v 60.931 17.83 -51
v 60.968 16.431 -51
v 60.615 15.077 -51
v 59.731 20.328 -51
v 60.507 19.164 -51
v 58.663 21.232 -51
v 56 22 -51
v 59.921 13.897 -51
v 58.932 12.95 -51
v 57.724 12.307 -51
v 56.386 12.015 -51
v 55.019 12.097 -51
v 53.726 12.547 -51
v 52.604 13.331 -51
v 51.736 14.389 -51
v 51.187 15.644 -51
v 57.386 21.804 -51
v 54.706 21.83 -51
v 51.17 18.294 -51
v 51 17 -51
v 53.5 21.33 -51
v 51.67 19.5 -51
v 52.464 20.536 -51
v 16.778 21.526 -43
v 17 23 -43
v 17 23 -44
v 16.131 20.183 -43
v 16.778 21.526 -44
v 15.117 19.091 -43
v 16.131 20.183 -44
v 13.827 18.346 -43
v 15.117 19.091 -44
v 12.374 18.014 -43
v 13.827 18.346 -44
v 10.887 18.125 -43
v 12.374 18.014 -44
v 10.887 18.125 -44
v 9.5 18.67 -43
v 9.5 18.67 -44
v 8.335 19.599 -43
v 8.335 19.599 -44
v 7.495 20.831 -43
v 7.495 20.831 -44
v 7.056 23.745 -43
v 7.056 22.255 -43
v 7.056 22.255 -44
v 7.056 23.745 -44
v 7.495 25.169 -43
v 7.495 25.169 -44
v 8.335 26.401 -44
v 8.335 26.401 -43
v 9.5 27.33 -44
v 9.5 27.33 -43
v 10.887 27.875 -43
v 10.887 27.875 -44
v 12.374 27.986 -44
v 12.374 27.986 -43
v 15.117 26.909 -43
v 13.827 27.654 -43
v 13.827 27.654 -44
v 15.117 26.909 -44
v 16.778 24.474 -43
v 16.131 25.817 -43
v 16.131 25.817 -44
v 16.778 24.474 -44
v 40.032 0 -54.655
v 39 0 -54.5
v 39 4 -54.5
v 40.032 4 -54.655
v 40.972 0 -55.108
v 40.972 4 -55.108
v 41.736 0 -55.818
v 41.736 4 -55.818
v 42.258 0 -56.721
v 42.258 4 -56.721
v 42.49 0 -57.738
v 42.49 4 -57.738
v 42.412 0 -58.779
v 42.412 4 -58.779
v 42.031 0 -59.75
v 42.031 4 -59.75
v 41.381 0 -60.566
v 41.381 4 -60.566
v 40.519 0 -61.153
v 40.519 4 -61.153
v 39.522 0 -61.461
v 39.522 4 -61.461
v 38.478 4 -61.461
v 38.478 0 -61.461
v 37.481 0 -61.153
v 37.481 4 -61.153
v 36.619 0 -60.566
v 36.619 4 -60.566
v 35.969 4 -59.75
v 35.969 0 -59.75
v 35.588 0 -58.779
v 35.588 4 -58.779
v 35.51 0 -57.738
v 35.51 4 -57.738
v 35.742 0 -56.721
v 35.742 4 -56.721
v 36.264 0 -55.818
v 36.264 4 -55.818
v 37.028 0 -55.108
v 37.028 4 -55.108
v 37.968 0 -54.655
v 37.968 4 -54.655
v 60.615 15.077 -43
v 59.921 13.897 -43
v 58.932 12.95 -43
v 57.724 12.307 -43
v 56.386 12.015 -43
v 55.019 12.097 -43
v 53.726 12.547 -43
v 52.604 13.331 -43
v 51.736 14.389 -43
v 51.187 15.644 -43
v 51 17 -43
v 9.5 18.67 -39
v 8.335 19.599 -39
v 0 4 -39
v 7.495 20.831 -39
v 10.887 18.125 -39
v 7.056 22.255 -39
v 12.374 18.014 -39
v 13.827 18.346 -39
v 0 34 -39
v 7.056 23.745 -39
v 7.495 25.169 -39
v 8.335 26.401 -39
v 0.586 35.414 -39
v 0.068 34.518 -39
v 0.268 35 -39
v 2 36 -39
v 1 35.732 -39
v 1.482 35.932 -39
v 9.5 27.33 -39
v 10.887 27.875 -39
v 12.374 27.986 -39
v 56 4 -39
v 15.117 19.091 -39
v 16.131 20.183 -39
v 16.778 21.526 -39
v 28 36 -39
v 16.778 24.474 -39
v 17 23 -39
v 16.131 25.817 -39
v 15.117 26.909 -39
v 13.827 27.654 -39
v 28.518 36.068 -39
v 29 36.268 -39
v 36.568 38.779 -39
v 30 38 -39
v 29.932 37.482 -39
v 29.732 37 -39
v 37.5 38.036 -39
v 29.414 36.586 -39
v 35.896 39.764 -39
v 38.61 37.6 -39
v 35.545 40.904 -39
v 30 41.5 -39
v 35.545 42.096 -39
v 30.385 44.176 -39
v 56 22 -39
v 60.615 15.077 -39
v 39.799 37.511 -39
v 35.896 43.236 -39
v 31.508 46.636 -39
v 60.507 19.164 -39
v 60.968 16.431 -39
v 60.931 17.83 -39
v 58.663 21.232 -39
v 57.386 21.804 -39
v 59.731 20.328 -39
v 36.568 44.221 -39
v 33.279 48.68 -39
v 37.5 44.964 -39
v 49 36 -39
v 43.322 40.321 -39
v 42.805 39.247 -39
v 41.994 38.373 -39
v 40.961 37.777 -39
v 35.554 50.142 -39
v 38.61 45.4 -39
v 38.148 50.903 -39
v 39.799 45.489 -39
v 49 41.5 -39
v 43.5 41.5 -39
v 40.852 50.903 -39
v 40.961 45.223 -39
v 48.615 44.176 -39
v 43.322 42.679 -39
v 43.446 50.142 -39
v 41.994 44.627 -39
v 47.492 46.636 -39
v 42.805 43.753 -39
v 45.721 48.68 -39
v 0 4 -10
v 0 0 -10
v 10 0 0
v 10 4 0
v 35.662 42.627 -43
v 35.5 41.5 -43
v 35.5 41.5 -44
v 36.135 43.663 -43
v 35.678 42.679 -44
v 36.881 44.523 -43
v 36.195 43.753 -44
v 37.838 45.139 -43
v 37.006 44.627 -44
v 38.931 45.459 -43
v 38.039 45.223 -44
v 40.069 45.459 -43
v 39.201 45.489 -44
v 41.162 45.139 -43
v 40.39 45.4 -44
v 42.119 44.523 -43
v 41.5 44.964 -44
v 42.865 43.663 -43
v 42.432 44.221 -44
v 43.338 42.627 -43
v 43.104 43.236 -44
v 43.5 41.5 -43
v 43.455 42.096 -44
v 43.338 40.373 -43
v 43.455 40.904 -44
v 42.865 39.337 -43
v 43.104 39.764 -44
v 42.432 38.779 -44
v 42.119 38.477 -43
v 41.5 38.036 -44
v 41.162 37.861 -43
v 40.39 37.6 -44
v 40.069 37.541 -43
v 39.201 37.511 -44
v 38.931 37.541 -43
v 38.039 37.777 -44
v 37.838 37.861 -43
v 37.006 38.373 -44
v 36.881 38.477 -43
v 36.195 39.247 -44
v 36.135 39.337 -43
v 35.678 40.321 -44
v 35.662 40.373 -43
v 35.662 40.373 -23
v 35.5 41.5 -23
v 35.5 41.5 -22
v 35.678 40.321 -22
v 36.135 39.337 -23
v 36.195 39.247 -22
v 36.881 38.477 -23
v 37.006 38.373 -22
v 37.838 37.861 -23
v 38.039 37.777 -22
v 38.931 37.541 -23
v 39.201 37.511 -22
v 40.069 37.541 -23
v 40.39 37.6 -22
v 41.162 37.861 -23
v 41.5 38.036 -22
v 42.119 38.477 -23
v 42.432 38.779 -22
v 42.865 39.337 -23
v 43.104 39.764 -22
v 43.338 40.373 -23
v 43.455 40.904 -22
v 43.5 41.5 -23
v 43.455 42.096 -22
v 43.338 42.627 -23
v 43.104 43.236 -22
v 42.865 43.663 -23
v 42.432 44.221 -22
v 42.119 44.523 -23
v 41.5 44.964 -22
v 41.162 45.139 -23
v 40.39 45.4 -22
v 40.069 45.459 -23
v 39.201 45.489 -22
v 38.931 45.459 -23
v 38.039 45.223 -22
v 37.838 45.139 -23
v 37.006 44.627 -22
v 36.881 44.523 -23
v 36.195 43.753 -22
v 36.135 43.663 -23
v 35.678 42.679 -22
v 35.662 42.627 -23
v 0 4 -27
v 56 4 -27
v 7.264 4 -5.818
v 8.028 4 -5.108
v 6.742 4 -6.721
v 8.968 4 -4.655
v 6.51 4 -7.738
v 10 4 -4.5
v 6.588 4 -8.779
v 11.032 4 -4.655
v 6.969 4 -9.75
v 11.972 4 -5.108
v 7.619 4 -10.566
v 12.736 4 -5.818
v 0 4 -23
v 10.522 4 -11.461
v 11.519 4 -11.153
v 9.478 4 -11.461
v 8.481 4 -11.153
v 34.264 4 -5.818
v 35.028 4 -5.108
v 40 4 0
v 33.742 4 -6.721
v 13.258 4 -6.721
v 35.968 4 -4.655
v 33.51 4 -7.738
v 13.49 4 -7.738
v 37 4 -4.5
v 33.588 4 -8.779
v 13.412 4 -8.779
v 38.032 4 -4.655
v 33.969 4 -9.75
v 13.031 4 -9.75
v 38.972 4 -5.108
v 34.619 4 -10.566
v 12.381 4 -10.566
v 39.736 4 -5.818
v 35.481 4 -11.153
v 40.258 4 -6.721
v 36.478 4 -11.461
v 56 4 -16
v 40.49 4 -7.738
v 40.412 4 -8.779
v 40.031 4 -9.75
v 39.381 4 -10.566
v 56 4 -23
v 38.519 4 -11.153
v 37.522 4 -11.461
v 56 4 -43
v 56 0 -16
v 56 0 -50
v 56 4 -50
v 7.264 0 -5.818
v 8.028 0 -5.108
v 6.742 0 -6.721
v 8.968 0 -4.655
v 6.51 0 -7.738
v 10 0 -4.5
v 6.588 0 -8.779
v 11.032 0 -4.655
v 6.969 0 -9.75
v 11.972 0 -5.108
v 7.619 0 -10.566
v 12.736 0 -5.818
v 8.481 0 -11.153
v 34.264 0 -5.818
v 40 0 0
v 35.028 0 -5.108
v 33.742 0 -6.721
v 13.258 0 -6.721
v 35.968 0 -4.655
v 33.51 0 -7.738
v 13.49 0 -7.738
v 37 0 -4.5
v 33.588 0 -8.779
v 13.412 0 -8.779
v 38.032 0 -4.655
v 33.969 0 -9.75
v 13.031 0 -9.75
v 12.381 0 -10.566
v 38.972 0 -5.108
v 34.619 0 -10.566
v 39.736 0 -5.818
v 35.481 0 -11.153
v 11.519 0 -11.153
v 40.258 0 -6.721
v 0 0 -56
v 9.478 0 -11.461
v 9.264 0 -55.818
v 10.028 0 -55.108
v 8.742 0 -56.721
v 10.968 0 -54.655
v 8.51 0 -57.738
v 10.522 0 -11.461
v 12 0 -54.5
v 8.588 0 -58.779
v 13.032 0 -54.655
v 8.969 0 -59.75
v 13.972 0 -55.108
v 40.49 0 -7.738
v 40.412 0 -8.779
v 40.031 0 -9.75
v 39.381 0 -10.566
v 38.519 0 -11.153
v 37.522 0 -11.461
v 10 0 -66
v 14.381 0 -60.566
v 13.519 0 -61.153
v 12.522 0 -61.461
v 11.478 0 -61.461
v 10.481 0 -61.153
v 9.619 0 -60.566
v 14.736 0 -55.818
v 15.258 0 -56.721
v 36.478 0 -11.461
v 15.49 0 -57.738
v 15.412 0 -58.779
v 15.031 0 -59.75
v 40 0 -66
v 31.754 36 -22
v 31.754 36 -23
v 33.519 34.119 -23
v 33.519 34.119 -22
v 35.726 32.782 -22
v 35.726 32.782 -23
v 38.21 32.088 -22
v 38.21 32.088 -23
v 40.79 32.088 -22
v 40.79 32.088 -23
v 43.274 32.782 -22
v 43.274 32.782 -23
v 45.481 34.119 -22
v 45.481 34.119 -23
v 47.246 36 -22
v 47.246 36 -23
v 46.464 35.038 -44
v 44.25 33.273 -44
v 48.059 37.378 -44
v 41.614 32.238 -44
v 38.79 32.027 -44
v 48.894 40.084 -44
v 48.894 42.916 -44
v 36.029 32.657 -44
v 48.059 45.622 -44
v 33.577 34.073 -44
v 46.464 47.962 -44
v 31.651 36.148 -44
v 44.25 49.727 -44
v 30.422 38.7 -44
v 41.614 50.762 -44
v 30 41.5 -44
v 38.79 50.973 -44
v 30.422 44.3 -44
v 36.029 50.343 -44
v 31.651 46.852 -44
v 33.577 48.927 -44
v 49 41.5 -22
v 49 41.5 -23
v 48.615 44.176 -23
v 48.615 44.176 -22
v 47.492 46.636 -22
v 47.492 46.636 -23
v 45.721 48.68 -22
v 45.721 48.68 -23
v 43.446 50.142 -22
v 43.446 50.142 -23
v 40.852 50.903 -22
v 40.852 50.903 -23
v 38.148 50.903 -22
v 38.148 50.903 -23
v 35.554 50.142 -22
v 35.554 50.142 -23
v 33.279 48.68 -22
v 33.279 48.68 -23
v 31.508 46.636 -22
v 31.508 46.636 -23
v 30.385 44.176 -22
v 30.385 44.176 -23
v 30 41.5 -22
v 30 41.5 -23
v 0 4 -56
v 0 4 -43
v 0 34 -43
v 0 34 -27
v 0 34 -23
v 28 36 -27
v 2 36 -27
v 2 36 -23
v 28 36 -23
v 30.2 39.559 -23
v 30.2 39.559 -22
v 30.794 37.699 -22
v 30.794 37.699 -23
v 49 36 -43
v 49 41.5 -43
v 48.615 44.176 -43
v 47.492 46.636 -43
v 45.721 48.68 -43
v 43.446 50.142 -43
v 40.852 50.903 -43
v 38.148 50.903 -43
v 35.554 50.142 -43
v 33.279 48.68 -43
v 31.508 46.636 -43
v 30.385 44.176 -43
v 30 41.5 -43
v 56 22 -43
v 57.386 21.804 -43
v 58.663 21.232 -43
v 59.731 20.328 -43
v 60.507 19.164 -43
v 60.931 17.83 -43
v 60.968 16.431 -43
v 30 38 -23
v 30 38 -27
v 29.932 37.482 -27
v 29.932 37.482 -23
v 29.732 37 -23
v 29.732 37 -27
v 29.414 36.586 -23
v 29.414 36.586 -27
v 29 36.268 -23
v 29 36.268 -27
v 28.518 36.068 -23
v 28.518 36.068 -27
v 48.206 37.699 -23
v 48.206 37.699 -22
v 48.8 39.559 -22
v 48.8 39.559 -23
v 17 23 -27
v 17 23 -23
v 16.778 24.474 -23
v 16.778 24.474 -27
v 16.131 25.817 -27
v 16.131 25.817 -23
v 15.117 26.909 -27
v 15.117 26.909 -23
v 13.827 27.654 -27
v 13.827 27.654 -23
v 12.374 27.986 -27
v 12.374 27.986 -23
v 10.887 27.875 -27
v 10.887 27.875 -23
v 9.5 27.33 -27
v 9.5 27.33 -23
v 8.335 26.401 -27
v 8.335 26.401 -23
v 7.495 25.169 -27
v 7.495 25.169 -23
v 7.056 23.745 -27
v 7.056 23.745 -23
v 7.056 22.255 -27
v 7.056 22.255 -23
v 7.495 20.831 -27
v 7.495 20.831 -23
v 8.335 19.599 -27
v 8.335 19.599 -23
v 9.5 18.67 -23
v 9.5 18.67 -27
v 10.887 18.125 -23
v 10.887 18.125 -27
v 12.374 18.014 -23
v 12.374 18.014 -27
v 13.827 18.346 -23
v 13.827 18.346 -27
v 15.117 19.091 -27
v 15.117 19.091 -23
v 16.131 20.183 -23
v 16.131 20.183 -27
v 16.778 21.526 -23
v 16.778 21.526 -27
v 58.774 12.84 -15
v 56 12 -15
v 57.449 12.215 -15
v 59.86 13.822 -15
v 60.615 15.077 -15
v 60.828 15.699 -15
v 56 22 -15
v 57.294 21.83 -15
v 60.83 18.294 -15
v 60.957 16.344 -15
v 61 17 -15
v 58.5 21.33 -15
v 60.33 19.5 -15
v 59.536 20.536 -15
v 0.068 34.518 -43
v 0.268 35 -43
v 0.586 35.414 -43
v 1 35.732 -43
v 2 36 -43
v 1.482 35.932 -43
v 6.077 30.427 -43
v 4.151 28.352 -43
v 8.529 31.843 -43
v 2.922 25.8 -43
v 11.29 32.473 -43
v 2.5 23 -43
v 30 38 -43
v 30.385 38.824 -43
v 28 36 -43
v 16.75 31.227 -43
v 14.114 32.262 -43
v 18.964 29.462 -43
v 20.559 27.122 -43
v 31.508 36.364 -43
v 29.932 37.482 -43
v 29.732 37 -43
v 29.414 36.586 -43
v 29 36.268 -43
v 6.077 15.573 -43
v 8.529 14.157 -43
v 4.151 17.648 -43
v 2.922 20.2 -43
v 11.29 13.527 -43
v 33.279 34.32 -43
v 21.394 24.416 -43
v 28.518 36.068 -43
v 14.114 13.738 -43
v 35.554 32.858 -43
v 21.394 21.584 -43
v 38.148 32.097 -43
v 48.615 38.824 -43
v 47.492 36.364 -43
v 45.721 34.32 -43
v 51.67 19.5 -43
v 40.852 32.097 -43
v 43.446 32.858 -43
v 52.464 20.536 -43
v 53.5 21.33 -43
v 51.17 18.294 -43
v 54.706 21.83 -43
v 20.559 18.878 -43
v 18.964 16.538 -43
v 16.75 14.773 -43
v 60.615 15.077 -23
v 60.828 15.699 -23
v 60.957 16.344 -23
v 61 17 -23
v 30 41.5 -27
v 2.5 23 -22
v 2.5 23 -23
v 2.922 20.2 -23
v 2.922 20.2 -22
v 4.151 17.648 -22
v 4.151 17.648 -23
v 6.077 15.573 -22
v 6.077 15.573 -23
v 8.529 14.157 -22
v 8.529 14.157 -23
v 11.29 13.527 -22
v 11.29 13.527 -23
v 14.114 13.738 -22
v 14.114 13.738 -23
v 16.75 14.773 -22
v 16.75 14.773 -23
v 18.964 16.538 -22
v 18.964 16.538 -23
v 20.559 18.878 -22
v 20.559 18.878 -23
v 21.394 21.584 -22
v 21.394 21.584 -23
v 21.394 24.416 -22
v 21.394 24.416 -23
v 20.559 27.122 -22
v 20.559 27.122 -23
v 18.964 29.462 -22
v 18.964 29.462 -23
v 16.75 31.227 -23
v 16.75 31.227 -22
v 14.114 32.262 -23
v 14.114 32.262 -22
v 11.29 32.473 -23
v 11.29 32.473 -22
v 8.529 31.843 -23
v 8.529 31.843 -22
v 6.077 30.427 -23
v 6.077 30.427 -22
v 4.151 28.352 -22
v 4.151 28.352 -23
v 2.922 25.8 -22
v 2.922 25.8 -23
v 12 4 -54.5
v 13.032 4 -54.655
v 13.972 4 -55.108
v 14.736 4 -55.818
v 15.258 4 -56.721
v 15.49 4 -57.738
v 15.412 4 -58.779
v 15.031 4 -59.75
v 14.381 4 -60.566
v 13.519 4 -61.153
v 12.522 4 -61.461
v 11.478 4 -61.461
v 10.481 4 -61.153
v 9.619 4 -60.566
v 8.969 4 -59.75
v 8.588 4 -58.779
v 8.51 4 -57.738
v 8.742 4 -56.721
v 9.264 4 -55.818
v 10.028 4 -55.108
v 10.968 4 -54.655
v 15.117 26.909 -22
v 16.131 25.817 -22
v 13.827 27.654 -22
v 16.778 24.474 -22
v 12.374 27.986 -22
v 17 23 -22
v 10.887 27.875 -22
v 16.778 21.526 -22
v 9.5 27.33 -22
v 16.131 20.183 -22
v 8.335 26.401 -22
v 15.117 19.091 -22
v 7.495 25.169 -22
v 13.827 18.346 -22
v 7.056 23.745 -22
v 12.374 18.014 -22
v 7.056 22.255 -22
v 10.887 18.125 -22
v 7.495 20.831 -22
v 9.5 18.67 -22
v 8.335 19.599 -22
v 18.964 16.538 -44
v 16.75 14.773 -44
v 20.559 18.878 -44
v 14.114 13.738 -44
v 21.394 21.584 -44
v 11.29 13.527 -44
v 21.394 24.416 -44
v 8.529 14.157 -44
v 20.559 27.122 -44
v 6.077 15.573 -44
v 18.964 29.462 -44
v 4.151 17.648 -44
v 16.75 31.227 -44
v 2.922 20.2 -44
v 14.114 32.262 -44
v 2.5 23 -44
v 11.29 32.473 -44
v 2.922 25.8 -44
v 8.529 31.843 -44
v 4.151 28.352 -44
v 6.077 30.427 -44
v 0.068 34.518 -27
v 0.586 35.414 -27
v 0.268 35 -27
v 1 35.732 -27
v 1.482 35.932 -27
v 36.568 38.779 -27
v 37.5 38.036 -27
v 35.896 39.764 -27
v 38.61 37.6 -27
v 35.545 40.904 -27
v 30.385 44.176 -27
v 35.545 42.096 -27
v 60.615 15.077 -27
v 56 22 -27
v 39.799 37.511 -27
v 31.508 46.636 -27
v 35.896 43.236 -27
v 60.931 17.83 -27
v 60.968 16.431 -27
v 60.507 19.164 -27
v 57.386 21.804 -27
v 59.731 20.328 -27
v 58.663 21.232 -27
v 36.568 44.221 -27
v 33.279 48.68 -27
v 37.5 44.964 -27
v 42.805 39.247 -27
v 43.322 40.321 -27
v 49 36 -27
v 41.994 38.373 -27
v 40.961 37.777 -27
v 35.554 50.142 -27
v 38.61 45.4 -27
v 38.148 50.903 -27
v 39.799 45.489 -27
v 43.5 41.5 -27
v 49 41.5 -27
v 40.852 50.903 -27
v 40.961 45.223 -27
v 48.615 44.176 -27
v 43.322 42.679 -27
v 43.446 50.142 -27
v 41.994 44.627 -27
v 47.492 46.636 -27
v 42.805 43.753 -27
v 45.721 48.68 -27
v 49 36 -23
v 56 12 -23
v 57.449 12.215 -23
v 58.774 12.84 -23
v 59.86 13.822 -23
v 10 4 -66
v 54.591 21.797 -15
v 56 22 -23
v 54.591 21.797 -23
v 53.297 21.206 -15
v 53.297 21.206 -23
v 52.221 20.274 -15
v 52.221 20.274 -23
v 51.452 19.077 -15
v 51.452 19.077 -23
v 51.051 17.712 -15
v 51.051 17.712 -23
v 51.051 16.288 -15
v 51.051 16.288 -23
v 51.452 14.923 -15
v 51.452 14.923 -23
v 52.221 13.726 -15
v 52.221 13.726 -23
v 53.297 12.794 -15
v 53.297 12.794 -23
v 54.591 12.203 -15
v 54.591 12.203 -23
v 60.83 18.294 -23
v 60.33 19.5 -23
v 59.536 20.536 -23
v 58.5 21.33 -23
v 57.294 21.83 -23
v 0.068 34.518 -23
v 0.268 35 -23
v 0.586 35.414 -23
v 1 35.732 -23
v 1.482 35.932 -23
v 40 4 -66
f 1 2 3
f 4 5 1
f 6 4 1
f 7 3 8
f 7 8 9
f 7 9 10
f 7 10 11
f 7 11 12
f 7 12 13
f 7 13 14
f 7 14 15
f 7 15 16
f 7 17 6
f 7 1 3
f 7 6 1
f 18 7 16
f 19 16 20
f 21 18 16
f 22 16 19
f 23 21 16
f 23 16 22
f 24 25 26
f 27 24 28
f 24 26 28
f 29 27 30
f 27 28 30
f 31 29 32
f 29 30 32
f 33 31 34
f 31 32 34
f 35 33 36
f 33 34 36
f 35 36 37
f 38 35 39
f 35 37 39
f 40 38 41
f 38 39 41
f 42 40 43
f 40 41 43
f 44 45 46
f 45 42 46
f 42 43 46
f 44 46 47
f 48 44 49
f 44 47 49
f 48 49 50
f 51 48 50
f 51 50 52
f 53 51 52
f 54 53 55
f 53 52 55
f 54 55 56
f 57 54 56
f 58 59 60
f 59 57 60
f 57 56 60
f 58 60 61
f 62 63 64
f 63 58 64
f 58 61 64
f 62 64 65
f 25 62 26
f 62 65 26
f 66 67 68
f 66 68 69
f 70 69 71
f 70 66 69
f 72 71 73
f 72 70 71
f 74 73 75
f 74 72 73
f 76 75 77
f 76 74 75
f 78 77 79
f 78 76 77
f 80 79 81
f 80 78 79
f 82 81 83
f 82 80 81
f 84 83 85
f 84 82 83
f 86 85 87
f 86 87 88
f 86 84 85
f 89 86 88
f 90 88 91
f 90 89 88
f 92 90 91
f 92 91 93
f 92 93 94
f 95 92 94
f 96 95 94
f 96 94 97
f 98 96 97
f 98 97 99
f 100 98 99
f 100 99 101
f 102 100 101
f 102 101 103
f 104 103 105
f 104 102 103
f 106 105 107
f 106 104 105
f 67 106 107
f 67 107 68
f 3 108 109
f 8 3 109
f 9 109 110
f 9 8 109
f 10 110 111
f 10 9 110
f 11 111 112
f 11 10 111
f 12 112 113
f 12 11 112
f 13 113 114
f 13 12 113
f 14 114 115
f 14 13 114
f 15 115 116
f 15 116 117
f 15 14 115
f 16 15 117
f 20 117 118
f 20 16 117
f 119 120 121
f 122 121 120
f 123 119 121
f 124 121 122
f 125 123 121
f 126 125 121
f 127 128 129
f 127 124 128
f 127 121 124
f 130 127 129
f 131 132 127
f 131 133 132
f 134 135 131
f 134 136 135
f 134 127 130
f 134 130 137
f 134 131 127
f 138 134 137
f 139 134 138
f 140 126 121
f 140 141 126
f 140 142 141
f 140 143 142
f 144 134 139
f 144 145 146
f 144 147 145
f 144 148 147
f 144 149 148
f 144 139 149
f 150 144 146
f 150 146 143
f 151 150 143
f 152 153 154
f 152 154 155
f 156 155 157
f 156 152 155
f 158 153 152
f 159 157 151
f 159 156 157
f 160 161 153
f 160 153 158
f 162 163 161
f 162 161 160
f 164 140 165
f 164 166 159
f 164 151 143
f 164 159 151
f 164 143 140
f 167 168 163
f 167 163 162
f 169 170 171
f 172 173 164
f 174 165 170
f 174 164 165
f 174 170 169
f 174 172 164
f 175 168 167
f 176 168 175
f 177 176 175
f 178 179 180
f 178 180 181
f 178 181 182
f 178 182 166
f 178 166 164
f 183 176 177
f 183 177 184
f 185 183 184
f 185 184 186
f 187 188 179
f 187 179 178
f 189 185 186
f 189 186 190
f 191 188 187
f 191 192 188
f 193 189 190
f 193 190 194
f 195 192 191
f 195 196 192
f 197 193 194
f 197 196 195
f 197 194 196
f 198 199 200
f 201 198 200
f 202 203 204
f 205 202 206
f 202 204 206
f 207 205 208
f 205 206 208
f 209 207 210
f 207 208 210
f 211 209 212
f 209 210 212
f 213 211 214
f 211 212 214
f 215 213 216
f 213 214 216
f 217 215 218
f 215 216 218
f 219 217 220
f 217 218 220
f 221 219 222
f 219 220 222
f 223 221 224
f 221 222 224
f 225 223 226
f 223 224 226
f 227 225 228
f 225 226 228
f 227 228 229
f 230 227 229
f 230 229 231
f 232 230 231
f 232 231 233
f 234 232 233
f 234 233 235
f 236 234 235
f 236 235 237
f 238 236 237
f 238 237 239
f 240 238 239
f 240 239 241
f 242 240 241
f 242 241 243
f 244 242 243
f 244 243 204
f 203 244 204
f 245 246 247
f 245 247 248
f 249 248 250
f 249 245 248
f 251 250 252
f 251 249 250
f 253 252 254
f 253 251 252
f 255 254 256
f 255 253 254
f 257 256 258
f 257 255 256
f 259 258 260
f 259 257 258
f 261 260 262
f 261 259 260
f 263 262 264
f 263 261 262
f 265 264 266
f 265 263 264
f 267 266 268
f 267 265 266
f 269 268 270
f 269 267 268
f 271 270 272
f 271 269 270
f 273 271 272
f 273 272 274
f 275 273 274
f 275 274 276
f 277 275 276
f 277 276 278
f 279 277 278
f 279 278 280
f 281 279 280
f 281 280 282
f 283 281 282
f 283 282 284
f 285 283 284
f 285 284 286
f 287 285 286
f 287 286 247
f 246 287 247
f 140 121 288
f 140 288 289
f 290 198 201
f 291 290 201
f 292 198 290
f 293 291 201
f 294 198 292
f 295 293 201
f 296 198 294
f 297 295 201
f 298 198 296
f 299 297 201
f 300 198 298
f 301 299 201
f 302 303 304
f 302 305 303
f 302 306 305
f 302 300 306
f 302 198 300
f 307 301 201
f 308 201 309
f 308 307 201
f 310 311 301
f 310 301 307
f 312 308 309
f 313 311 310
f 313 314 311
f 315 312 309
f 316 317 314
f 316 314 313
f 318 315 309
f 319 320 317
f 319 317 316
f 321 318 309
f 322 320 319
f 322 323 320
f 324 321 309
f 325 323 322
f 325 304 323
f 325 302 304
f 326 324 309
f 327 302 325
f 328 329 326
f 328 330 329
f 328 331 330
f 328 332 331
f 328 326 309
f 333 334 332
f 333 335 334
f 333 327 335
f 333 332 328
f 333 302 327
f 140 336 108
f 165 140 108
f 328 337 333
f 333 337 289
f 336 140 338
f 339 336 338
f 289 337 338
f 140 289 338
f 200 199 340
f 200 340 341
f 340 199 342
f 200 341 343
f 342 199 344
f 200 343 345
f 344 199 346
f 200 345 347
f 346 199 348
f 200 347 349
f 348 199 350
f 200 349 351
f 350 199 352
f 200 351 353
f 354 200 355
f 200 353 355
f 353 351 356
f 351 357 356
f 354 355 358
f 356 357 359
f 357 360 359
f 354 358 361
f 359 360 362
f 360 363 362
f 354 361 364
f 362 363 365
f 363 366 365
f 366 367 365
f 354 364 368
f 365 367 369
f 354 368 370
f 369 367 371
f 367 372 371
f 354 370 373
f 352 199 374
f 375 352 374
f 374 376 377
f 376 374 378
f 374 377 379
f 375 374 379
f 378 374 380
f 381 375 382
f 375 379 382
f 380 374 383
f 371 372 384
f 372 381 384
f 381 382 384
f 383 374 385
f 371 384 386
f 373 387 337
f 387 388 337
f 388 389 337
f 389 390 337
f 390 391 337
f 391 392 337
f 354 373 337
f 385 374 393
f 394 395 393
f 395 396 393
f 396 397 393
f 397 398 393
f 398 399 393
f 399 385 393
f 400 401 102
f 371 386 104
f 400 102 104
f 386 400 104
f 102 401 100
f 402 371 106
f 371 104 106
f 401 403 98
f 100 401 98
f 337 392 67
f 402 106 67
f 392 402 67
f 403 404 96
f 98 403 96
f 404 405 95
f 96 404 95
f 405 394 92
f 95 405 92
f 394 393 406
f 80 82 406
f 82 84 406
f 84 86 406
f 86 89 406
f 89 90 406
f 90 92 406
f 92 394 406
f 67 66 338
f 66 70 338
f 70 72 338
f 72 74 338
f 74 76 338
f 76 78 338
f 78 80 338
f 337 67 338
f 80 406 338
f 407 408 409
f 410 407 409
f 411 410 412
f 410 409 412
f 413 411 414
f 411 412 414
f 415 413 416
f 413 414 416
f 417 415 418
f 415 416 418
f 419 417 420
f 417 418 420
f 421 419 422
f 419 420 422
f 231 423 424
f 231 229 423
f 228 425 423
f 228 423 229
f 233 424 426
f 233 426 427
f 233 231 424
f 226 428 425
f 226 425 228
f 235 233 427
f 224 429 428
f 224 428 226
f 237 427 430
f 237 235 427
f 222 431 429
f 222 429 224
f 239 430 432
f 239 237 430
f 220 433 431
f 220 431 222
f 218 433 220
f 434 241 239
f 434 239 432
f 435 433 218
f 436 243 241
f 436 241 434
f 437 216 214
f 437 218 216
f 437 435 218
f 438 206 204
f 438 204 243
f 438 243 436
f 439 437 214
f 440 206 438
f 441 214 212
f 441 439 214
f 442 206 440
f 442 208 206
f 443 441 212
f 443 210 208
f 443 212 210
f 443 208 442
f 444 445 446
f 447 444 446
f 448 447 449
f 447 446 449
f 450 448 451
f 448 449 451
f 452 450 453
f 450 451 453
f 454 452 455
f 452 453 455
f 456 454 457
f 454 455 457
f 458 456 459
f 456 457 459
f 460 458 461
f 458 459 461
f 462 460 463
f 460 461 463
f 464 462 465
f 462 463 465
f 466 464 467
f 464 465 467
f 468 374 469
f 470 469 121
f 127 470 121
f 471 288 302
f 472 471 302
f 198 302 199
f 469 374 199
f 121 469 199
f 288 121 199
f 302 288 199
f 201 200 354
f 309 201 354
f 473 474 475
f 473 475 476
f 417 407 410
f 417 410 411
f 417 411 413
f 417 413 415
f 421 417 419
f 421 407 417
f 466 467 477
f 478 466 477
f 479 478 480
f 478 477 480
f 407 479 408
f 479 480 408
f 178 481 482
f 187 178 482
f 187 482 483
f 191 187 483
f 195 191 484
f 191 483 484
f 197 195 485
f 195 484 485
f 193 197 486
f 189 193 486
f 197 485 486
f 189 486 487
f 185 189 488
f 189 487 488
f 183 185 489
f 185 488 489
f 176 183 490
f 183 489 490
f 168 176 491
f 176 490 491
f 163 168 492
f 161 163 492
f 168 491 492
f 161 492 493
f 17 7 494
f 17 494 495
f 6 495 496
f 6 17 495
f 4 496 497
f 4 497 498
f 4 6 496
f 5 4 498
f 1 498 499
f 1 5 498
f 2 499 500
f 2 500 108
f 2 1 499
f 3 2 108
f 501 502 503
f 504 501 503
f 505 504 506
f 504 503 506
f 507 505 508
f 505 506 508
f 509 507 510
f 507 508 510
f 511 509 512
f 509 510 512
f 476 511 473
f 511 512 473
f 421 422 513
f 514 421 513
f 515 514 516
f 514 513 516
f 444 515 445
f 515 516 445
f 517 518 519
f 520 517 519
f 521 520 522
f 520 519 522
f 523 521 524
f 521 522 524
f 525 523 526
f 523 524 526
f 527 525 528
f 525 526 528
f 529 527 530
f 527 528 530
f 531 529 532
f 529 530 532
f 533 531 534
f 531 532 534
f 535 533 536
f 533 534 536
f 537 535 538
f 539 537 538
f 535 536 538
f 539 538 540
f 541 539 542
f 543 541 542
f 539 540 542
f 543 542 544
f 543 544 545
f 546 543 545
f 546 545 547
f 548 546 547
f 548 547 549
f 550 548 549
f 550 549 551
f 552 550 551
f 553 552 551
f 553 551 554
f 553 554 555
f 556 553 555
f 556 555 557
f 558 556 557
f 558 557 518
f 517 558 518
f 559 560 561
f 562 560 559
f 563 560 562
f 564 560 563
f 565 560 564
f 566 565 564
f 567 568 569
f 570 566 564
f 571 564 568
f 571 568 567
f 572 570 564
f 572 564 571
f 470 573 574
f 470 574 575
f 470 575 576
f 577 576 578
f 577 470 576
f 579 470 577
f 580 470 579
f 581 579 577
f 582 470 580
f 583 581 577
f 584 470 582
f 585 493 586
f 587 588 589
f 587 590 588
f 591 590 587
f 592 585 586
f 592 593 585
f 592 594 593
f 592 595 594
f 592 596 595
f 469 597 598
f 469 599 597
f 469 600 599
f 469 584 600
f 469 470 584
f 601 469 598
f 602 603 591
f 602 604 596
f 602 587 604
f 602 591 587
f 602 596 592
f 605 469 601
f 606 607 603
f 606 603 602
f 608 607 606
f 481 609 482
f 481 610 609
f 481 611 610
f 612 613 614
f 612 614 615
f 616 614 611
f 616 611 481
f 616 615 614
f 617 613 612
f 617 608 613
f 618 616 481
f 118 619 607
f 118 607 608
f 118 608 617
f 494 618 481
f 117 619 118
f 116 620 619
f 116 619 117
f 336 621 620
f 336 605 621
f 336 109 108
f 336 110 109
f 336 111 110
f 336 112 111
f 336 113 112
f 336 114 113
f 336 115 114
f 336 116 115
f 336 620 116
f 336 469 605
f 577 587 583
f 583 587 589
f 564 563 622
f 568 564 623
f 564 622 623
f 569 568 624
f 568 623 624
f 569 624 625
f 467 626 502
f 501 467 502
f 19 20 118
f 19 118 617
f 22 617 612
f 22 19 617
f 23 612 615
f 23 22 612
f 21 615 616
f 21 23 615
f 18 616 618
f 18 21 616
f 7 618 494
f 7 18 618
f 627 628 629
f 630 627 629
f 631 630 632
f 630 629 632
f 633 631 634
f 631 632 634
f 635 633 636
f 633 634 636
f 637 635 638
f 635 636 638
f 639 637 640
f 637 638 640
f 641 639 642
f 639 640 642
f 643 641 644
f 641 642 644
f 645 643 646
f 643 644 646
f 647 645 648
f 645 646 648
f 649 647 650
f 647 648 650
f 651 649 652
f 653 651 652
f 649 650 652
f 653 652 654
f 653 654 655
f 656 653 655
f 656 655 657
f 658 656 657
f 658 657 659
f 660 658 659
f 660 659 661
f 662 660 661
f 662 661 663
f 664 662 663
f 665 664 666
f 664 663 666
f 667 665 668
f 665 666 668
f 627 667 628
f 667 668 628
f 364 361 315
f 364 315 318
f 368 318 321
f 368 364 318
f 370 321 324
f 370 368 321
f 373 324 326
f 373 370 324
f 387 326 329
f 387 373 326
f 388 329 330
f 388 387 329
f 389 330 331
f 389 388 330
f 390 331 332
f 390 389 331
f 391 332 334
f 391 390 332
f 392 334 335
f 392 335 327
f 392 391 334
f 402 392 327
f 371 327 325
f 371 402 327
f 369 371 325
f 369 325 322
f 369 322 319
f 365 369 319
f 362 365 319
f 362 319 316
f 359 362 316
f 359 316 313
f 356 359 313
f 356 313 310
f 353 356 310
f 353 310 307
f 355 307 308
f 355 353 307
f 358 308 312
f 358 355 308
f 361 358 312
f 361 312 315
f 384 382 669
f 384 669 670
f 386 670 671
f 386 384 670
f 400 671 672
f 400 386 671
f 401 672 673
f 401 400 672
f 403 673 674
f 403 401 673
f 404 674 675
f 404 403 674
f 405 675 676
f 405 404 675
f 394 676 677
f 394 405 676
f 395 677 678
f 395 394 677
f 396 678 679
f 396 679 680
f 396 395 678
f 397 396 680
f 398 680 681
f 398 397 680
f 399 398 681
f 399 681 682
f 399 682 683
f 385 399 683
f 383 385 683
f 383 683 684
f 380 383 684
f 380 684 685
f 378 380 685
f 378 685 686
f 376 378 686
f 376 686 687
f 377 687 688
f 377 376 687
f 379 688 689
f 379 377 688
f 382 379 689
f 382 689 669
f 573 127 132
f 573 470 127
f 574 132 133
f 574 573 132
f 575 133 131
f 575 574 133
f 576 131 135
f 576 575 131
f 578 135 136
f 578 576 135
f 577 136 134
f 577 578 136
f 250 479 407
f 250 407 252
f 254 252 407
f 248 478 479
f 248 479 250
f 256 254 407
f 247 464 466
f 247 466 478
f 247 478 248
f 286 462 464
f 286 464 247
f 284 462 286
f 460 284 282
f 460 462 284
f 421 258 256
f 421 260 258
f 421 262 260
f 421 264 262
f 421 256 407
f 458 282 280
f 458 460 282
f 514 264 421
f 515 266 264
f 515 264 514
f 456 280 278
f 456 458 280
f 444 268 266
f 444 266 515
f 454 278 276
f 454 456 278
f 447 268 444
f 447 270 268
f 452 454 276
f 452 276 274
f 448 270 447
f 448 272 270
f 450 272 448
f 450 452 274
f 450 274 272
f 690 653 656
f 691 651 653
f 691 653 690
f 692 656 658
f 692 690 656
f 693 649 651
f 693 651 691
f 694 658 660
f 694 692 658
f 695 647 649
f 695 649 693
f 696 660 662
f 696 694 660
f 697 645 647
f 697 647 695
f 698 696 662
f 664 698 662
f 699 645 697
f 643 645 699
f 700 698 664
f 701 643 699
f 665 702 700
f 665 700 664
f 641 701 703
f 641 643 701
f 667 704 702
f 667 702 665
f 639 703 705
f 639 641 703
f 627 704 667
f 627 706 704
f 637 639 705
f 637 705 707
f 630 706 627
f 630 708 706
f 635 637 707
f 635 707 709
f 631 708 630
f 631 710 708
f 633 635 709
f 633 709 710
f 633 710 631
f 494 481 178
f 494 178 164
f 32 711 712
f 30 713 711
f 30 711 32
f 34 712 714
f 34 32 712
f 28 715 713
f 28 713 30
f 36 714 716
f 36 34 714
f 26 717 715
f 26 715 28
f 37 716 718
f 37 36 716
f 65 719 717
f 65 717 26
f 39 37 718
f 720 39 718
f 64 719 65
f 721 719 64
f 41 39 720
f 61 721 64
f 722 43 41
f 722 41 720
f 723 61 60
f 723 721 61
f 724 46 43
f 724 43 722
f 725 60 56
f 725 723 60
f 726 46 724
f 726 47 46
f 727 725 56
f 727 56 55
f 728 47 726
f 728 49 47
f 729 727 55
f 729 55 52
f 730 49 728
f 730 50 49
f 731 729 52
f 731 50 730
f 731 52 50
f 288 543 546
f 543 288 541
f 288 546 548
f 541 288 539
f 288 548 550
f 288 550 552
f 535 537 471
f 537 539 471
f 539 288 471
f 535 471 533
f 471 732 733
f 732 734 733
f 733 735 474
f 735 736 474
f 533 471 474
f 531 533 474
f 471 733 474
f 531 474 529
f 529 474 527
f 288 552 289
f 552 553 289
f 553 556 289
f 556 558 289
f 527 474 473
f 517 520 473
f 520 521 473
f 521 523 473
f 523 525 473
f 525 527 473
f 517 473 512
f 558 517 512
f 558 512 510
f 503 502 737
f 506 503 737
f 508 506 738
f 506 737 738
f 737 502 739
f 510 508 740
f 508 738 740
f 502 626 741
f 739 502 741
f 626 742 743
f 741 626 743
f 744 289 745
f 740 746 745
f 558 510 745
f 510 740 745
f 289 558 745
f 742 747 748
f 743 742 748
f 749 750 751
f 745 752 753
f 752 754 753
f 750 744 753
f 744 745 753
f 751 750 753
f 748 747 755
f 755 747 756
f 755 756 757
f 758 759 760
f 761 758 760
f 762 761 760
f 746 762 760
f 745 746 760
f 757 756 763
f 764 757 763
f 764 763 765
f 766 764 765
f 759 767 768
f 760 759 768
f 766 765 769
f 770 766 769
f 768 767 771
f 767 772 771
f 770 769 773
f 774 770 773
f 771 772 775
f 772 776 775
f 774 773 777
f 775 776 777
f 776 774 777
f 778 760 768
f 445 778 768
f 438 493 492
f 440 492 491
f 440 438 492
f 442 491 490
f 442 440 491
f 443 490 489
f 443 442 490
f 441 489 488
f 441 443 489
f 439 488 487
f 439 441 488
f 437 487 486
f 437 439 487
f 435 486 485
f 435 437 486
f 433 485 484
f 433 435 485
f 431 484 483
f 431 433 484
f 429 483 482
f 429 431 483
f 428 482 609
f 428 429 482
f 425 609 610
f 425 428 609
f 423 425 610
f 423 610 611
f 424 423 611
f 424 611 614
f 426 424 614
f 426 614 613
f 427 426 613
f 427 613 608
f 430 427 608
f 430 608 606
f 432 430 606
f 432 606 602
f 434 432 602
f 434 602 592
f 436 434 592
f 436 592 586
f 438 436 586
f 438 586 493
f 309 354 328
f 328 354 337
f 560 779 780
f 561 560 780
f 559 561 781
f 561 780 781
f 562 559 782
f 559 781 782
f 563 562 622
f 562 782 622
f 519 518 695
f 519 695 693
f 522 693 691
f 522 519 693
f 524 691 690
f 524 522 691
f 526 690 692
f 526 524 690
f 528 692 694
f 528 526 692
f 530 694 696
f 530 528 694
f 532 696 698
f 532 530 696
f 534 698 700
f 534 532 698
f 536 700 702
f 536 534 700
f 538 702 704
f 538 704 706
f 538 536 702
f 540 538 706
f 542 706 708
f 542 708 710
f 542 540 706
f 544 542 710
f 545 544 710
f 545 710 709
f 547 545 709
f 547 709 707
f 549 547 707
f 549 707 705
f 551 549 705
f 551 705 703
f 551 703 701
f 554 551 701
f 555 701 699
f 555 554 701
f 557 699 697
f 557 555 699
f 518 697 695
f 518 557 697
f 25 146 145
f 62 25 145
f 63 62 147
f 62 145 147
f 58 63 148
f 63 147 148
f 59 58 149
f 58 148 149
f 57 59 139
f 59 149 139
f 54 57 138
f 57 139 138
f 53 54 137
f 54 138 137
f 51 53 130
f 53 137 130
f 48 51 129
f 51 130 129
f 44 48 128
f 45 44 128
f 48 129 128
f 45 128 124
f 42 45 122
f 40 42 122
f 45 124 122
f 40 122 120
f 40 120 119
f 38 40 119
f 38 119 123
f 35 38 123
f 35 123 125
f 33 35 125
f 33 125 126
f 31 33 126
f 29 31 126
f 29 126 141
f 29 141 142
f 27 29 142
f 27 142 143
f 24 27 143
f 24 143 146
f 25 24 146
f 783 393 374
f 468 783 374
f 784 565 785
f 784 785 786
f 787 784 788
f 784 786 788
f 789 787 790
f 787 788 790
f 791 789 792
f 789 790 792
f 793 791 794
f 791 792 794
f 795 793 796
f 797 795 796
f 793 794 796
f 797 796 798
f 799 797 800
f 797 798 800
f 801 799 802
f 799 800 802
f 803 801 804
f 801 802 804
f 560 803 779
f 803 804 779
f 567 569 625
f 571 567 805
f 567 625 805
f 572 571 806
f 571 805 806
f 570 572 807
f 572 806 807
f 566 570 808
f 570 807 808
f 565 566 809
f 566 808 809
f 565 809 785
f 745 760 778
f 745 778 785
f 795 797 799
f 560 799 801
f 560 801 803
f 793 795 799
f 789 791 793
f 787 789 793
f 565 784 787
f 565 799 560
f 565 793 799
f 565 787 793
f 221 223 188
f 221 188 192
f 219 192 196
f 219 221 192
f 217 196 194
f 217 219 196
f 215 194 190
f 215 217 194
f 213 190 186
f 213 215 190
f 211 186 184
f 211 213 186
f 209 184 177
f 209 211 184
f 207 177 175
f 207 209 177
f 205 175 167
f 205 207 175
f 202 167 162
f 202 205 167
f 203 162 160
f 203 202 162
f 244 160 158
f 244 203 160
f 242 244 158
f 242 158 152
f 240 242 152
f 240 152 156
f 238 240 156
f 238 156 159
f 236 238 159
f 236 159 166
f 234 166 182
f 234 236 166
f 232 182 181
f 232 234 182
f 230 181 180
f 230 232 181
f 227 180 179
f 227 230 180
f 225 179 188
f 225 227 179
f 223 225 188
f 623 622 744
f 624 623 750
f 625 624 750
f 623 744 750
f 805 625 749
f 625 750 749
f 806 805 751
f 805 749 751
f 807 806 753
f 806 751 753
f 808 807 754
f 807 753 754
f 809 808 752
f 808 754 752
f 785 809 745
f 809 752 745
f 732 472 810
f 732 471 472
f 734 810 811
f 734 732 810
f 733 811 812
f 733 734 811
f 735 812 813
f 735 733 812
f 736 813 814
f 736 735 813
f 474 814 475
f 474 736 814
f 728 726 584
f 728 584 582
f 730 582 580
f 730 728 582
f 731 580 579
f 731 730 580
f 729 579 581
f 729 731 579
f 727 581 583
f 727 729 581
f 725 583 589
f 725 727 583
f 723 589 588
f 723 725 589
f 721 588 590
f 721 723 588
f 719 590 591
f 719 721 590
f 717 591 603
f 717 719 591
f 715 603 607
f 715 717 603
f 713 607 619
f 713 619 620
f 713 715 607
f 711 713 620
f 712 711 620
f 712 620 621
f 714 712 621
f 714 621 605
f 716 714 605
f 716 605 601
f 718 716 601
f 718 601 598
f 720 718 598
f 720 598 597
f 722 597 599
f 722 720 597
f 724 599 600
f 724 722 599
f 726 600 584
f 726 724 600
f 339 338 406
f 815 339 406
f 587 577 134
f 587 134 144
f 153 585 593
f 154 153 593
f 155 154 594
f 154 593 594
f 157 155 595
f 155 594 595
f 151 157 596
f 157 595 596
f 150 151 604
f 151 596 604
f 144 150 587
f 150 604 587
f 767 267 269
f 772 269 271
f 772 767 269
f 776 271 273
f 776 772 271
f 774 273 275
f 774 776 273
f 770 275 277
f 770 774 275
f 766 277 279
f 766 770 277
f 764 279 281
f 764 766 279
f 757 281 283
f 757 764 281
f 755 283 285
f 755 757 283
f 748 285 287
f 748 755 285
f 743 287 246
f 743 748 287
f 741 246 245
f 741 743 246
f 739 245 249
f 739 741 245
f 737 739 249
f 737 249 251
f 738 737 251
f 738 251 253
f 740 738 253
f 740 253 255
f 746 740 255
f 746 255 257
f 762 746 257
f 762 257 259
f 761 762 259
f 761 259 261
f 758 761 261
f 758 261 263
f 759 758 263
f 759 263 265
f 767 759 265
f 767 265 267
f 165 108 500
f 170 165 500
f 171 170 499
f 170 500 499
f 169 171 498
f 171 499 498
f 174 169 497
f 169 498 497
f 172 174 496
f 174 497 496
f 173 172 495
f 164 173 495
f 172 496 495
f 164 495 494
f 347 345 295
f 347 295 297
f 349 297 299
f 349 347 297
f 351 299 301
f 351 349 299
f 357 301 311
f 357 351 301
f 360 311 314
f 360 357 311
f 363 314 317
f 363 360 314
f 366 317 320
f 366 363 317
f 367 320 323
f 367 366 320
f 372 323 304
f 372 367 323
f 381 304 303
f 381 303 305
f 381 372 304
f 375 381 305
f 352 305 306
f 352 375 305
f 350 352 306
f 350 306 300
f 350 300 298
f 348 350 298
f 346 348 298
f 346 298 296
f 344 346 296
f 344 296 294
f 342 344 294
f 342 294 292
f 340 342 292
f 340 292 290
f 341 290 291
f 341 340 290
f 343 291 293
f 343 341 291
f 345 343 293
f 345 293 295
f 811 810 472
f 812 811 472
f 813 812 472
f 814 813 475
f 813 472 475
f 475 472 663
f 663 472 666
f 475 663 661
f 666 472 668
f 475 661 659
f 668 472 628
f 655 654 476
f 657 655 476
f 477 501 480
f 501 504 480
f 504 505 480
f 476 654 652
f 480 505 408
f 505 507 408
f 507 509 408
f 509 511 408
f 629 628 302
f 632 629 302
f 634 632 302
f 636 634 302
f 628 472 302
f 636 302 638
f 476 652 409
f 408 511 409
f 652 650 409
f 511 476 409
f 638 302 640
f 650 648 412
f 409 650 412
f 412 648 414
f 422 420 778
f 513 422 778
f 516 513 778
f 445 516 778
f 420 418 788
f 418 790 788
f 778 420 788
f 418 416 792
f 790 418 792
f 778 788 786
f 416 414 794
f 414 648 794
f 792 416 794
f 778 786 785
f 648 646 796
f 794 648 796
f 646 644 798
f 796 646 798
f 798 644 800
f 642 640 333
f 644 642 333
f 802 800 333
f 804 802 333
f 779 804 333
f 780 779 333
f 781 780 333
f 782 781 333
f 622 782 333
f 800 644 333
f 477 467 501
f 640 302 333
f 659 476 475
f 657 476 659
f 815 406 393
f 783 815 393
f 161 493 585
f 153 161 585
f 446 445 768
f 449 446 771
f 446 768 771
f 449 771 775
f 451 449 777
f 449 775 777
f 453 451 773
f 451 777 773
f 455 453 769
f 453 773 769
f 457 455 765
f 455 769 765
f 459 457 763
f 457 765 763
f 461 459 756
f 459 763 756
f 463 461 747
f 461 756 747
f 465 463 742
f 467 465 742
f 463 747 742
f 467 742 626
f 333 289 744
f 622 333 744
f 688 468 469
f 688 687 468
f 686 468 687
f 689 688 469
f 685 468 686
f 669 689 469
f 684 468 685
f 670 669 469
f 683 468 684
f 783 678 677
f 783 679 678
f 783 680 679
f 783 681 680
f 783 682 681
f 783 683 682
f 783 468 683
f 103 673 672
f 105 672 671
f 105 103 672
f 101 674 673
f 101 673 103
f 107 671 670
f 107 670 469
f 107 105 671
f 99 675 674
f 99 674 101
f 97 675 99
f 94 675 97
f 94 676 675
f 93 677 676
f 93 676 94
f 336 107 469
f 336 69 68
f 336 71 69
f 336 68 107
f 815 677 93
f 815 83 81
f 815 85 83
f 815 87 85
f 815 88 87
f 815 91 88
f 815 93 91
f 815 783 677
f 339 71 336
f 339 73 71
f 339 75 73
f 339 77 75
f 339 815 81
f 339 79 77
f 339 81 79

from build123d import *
from build123d.topology import SkipClean

# Parameters (mm, degrees)
SKETCH1_R               = 3.5
SKETCH1_W               = 56
SKETCH1_H               = 4
SKETCH1_H_2             = 12
BOSS_EXTRUDE1_DEPTH     = 4
SKETCH1_3_W             = 56
SKETCH1_3_H             = 4
BOSS_EXTRUDE2_DEPTH     = 36
SKETCH2_R               = 5
CUT_EXTRUDE1_DEPTH      = 36
BOSS_EXTRUDE3_START     = -20
BOSS_EXTRUDE3_OUTLINE_R = 9.5
BOSS_EXTRUDE3_DEPTH     = 20
CUT_EXTRUDE2_START      = -21
SKETCH2_4_R             = 4
CUT_EXTRUDE2_DEPTH      = 21
SKETCH4_W               = 61
SKETCH4_H               = 12
CUT_EXTRUDE3_DEPTH      = 47
BOSS_EXTRUDE4_START     = 1
SKETCH5_R               = 4
SKETCH5_R_2             = 9.5
SKETCH5_R_3             = 5
BOSS_EXTRUDE4_DEPTH     = 1
BOSS_EXTRUDE5_START     = 8
BOSS_EXTRUDE5_DEPTH     = 8
BOSS_EXTRUDE6_DEPTH     = 8
SKETCH2_6_R             = 9.5
SKETCH2_6_R_2           = 5
SKETCH2_6_R_3           = 4
BOSS_EXTRUDE7_DEPTH     = 1


# Read off the part's stored shape, not the designer's step: Boss-Extrude3
with BuildPart() as part:
    # Sketch1 → Boss-Extrude1 (new body)
    # profile 1 of 5: a face of its own
    with BuildSketch(Plane(origin=(0, 0, 0), x_dir=(1, 0, 0), z_dir=(0, 1, 0))):
        Polygon((56, 23), (0, 23), (0, 10), (10, 0), (40, 0), (56, 16), align=None)
        with Locations(Location((10, 8, 0), (0, 0, 270))):
            Circle(SKETCH1_R, mode=Mode.SUBTRACT)
        with Locations(Location((37, 8, 0), (0, 0, 270))):
            Circle(SKETCH1_R, mode=Mode.SUBTRACT)
    # profile 2 of 5: a face of its own
    with BuildSketch(Plane(origin=(0, 0, 0), x_dir=(1, 0, 0), z_dir=(0, 1, 0))):
        with Locations((28, 25)):
            Rectangle(SKETCH1_W, SKETCH1_H)
    # profile 3 of 5: a face of its own
    with BuildSketch(Plane(origin=(0, 0, 0), x_dir=(1, 0, 0), z_dir=(0, 1, 0))):
        with Locations((28, 33)):
            Rectangle(SKETCH1_W, SKETCH1_H_2)
    # profile 4 of 5: a face of its own
    with BuildSketch(Plane(origin=(0, 0, 0), x_dir=(1, 0, 0), z_dir=(0, 1, 0))):
        with Locations((28, 41)):
            Rectangle(SKETCH1_W, SKETCH1_H)
    # profile 5 of 5: a face of its own
    with BuildSketch(Plane(origin=(0, 0, 0), x_dir=(1, 0, 0), z_dir=(0, 1, 0))):
        Polygon((40, 66), (10, 66), (0, 56), (0, 43), (56, 43), (56, 50), align=None)
        with Locations(Location((12, 58, 0), (0, 0, 270))):
            Circle(SKETCH1_R, mode=Mode.SUBTRACT)
        with Locations(Location((39, 58, 0), (0, 0, 270))):
            Circle(SKETCH1_R, mode=Mode.SUBTRACT)
    extrude(amount=BOSS_EXTRUDE1_DEPTH)

    # Sketch1<3> → Boss-Extrude2 (add)
    with BuildSketch(Plane(origin=(0, 0, 0), x_dir=(1, 0, 0), z_dir=(0, 1, 0))):
        with Locations((28, 41)):
            Rectangle(SKETCH1_3_W, SKETCH1_3_H)
        with Locations((28, 25)):
            Rectangle(SKETCH1_3_W, SKETCH1_3_H)
    extrude(amount=BOSS_EXTRUDE2_DEPTH)

    # Sketch2 → Cut-Extrude1 (cut)
    with BuildSketch(Plane.XY.offset(-23)):
        with Locations((12, 23)):
            Circle(SKETCH2_R)
    extrude(amount=-CUT_EXTRUDE1_DEPTH, mode=Mode.SUBTRACT)

    # Boss-Extrude3 outline → Boss-Extrude3 (add)
    with BuildSketch(Plane.XY.offset(-23).offset(BOSS_EXTRUDE3_START)):
        with BuildLine():
            Line((28, 36), (2, 36))
            ThreePointArc((2, 36), (0.585786438, 35.414213562), (0, 34))
            Line((0, 34), (0, 4))
            Line((0, 4), (56, 4))
            Line((56, 4), (60.615384615, 15.076923077))
            ThreePointArc((60.615384615, 15.076923077), (60.160251472, 19.773500981), (56, 22))
            Line((56, 22), (49, 36))
            Line((49, 36), (49, 41.5))
            ThreePointArc((49, 41.5), (39.5, 51), (30, 41.5))
            Line((30, 41.5), (30, 38))
            ThreePointArc((30, 38), (29.414213562, 36.585786438), (28, 36))
        make_face()
        with Locations((12, 23)):
            Circle(BOSS_EXTRUDE3_OUTLINE_R, mode=Mode.SUBTRACT)
    extrude(amount=BOSS_EXTRUDE3_DEPTH)

    # Sketch2<4> → Cut-Extrude2 (cut)
    with SkipClean():  # the faces are left unmerged after this step: merging them gives an invalid solid
        with BuildSketch(Plane.XY.offset(-23).offset(CUT_EXTRUDE2_START)):
            with BuildLine():
                Line((30, 38), (30, 41.5))
                ThreePointArc((30, 41.5), (39.5, 51), (49, 41.5))
                Line((49, 41.5), (49, 36))
                Line((49, 36), (56, 36))
                Line((56, 36), (56, 22))
                ThreePointArc((56, 22), (59.535533906, 20.535533906), (61, 17))
                ThreePointArc((61, 17), (60.902903378, 16.019419324), (60.615384615, 15.076923077))
                Line((60.615384615, 15.076923077), (56, 4))
                Line((56, 4), (64.674649384, 4))
                Line((64.674649384, 4), (64.674649384, 61.803942061))
                Line((64.674649384, 61.803942061), (-6.186238706, 61.803942061))
                Line((-6.186238706, 61.803942061), (-6.186238706, 4))
                Line((-6.186238706, 4), (0, 4))
                Line((0, 4), (0, 34))
                Line((0, 34), (0, 36))
                Line((0, 36), (2, 36))
                Line((2, 36), (28, 36))
                ThreePointArc((28, 36), (29.414213562, 36.585786438), (30, 38))
            make_face()
            with BuildLine():
                ThreePointArc((0, 34), (0.585786438, 35.414213562), (2, 36))
                Line((2, 36), (0, 36))
                Line((0, 36), (0, 34))
            make_face()
            Polygon((56, 36), (49, 36), (56, 22), align=None)
            with Locations((39.5, 41.5)):
                Circle(SKETCH2_4_R)
        extrude(amount=CUT_EXTRUDE2_DEPTH, mode=Mode.SUBTRACT)
    add(part.part.scale(1), mode=Mode.REPLACE)  # the faces are merged on a copy

    # Sketch4 → Cut-Extrude3 (cut)
    with BuildSketch(Plane(origin=(0, 51, 0), x_dir=(1, 0, 0), z_dir=(0, 1, 0))):
        with Locations((30.5, 33)):
            Rectangle(SKETCH4_W, SKETCH4_H)
    extrude(amount=-CUT_EXTRUDE3_DEPTH, mode=Mode.SUBTRACT)

    # Sketch5 → Boss-Extrude4 (add)
    # profile 1 of 2: a face of its own
    with SkipClean():  # the faces are left unmerged after this step: merging them gives an invalid solid
        with BuildSketch(Plane(origin=(0, 0, -43), x_dir=(-1, 0, 0), z_dir=(0, 0, -1)).offset(BOSS_EXTRUDE4_START)):
            with BuildLine():
                ThreePointArc((-49, 41.5), (-39.5, 32), (-30, 41.5))
                ThreePointArc((-30, 41.5), (-39.5, 51), (-49, 41.5))
            make_face()
            with Locations((-39.5, 41.5)):
                Circle(SKETCH5_R, mode=Mode.SUBTRACT)
        # profile 2 of 2: a face of its own
        with BuildSketch(Plane(origin=(0, 0, -43), x_dir=(-1, 0, 0), z_dir=(0, 0, -1)).offset(BOSS_EXTRUDE4_START)):
            with Locations((-12, 23)):
                Circle(SKETCH5_R_2)
            with Locations(Location((-12, 23, 0), (0, 0, 180))):
                Circle(SKETCH5_R_3, mode=Mode.SUBTRACT)
        extrude(amount=-BOSS_EXTRUDE4_DEPTH)

    # Sketch5<3> → Boss-Extrude5 (add)
    with SkipClean():  # the faces are left unmerged after this step: merging them gives an invalid solid
        with BuildSketch(Plane(origin=(0, 0, -43), x_dir=(-1, 0, 0), z_dir=(0, 0, -1)).offset(BOSS_EXTRUDE5_START)):
            with BuildLine():
                ThreePointArc((-60.615384615, 15.076923077), (-55.019419324, 12.097096622), (-51, 17))
                ThreePointArc((-51, 17), (-52.464466094, 20.535533906), (-56, 22))
                ThreePointArc((-56, 22), (-60.160251472, 19.773500981), (-60.615384615, 15.076923077))
            make_face()
        extrude(amount=-BOSS_EXTRUDE5_DEPTH)

    # Sketch2<5> → Boss-Extrude6 (add)
    with SkipClean():  # the faces are left unmerged after this step: merging them gives an invalid solid
        with BuildSketch(Plane.XY.offset(-23)):
            with BuildLine():
                Line((56, 12), (56, 22))
                ThreePointArc((56, 22), (51, 17), (56, 12))
            make_face()
            with BuildLine():
                ThreePointArc((61, 17), (59.535533906, 20.535533906), (56, 22))
                Line((56, 22), (56, 12))
                ThreePointArc((56, 12), (58.773500981, 12.839748528), (60.615384615, 15.076923077))
                ThreePointArc((60.615384615, 15.076923077), (60.902903378, 16.019419324), (61, 17))
            make_face()
        extrude(amount=BOSS_EXTRUDE6_DEPTH)

    # Sketch2<6> → Boss-Extrude7 (add)
    # profile 1 of 3: a face of its own
    with BuildSketch(Plane.XY.offset(-23)):
        with Locations(Location((12, 23, 0), (0, 0, 180))):
            Circle(SKETCH2_6_R)
        with Locations((12, 23)):
            Circle(SKETCH2_6_R_2, mode=Mode.SUBTRACT)
    # profile 2 of 3: a face of its own
    with BuildSketch(Plane.XY.offset(-23)):
        with BuildLine():
            ThreePointArc((49, 41.5), (39.5, 51), (30, 41.5))
            ThreePointArc((30, 41.5), (30.449124805, 38.613538808), (31.754033308, 36))
            Line((31.754033308, 36), (47.245966692, 36))
            ThreePointArc((47.245966692, 36), (48.550875195, 38.613538808), (49, 41.5))
        make_face()
        with Locations(Location((39.5, 41.5, 0), (0, 0, 180))):
            Circle(SKETCH2_6_R_3, mode=Mode.SUBTRACT)
    # profile 3 of 3: a face of its own
    with BuildSketch(Plane.XY.offset(-23)):
        with BuildLine():
            Line((47.245966692, 36), (31.754033308, 36))
            ThreePointArc((31.754033308, 36), (39.5, 32), (47.245966692, 36))
        make_face()
    extrude(amount=BOSS_EXTRUDE7_DEPTH)


solid = part.part
